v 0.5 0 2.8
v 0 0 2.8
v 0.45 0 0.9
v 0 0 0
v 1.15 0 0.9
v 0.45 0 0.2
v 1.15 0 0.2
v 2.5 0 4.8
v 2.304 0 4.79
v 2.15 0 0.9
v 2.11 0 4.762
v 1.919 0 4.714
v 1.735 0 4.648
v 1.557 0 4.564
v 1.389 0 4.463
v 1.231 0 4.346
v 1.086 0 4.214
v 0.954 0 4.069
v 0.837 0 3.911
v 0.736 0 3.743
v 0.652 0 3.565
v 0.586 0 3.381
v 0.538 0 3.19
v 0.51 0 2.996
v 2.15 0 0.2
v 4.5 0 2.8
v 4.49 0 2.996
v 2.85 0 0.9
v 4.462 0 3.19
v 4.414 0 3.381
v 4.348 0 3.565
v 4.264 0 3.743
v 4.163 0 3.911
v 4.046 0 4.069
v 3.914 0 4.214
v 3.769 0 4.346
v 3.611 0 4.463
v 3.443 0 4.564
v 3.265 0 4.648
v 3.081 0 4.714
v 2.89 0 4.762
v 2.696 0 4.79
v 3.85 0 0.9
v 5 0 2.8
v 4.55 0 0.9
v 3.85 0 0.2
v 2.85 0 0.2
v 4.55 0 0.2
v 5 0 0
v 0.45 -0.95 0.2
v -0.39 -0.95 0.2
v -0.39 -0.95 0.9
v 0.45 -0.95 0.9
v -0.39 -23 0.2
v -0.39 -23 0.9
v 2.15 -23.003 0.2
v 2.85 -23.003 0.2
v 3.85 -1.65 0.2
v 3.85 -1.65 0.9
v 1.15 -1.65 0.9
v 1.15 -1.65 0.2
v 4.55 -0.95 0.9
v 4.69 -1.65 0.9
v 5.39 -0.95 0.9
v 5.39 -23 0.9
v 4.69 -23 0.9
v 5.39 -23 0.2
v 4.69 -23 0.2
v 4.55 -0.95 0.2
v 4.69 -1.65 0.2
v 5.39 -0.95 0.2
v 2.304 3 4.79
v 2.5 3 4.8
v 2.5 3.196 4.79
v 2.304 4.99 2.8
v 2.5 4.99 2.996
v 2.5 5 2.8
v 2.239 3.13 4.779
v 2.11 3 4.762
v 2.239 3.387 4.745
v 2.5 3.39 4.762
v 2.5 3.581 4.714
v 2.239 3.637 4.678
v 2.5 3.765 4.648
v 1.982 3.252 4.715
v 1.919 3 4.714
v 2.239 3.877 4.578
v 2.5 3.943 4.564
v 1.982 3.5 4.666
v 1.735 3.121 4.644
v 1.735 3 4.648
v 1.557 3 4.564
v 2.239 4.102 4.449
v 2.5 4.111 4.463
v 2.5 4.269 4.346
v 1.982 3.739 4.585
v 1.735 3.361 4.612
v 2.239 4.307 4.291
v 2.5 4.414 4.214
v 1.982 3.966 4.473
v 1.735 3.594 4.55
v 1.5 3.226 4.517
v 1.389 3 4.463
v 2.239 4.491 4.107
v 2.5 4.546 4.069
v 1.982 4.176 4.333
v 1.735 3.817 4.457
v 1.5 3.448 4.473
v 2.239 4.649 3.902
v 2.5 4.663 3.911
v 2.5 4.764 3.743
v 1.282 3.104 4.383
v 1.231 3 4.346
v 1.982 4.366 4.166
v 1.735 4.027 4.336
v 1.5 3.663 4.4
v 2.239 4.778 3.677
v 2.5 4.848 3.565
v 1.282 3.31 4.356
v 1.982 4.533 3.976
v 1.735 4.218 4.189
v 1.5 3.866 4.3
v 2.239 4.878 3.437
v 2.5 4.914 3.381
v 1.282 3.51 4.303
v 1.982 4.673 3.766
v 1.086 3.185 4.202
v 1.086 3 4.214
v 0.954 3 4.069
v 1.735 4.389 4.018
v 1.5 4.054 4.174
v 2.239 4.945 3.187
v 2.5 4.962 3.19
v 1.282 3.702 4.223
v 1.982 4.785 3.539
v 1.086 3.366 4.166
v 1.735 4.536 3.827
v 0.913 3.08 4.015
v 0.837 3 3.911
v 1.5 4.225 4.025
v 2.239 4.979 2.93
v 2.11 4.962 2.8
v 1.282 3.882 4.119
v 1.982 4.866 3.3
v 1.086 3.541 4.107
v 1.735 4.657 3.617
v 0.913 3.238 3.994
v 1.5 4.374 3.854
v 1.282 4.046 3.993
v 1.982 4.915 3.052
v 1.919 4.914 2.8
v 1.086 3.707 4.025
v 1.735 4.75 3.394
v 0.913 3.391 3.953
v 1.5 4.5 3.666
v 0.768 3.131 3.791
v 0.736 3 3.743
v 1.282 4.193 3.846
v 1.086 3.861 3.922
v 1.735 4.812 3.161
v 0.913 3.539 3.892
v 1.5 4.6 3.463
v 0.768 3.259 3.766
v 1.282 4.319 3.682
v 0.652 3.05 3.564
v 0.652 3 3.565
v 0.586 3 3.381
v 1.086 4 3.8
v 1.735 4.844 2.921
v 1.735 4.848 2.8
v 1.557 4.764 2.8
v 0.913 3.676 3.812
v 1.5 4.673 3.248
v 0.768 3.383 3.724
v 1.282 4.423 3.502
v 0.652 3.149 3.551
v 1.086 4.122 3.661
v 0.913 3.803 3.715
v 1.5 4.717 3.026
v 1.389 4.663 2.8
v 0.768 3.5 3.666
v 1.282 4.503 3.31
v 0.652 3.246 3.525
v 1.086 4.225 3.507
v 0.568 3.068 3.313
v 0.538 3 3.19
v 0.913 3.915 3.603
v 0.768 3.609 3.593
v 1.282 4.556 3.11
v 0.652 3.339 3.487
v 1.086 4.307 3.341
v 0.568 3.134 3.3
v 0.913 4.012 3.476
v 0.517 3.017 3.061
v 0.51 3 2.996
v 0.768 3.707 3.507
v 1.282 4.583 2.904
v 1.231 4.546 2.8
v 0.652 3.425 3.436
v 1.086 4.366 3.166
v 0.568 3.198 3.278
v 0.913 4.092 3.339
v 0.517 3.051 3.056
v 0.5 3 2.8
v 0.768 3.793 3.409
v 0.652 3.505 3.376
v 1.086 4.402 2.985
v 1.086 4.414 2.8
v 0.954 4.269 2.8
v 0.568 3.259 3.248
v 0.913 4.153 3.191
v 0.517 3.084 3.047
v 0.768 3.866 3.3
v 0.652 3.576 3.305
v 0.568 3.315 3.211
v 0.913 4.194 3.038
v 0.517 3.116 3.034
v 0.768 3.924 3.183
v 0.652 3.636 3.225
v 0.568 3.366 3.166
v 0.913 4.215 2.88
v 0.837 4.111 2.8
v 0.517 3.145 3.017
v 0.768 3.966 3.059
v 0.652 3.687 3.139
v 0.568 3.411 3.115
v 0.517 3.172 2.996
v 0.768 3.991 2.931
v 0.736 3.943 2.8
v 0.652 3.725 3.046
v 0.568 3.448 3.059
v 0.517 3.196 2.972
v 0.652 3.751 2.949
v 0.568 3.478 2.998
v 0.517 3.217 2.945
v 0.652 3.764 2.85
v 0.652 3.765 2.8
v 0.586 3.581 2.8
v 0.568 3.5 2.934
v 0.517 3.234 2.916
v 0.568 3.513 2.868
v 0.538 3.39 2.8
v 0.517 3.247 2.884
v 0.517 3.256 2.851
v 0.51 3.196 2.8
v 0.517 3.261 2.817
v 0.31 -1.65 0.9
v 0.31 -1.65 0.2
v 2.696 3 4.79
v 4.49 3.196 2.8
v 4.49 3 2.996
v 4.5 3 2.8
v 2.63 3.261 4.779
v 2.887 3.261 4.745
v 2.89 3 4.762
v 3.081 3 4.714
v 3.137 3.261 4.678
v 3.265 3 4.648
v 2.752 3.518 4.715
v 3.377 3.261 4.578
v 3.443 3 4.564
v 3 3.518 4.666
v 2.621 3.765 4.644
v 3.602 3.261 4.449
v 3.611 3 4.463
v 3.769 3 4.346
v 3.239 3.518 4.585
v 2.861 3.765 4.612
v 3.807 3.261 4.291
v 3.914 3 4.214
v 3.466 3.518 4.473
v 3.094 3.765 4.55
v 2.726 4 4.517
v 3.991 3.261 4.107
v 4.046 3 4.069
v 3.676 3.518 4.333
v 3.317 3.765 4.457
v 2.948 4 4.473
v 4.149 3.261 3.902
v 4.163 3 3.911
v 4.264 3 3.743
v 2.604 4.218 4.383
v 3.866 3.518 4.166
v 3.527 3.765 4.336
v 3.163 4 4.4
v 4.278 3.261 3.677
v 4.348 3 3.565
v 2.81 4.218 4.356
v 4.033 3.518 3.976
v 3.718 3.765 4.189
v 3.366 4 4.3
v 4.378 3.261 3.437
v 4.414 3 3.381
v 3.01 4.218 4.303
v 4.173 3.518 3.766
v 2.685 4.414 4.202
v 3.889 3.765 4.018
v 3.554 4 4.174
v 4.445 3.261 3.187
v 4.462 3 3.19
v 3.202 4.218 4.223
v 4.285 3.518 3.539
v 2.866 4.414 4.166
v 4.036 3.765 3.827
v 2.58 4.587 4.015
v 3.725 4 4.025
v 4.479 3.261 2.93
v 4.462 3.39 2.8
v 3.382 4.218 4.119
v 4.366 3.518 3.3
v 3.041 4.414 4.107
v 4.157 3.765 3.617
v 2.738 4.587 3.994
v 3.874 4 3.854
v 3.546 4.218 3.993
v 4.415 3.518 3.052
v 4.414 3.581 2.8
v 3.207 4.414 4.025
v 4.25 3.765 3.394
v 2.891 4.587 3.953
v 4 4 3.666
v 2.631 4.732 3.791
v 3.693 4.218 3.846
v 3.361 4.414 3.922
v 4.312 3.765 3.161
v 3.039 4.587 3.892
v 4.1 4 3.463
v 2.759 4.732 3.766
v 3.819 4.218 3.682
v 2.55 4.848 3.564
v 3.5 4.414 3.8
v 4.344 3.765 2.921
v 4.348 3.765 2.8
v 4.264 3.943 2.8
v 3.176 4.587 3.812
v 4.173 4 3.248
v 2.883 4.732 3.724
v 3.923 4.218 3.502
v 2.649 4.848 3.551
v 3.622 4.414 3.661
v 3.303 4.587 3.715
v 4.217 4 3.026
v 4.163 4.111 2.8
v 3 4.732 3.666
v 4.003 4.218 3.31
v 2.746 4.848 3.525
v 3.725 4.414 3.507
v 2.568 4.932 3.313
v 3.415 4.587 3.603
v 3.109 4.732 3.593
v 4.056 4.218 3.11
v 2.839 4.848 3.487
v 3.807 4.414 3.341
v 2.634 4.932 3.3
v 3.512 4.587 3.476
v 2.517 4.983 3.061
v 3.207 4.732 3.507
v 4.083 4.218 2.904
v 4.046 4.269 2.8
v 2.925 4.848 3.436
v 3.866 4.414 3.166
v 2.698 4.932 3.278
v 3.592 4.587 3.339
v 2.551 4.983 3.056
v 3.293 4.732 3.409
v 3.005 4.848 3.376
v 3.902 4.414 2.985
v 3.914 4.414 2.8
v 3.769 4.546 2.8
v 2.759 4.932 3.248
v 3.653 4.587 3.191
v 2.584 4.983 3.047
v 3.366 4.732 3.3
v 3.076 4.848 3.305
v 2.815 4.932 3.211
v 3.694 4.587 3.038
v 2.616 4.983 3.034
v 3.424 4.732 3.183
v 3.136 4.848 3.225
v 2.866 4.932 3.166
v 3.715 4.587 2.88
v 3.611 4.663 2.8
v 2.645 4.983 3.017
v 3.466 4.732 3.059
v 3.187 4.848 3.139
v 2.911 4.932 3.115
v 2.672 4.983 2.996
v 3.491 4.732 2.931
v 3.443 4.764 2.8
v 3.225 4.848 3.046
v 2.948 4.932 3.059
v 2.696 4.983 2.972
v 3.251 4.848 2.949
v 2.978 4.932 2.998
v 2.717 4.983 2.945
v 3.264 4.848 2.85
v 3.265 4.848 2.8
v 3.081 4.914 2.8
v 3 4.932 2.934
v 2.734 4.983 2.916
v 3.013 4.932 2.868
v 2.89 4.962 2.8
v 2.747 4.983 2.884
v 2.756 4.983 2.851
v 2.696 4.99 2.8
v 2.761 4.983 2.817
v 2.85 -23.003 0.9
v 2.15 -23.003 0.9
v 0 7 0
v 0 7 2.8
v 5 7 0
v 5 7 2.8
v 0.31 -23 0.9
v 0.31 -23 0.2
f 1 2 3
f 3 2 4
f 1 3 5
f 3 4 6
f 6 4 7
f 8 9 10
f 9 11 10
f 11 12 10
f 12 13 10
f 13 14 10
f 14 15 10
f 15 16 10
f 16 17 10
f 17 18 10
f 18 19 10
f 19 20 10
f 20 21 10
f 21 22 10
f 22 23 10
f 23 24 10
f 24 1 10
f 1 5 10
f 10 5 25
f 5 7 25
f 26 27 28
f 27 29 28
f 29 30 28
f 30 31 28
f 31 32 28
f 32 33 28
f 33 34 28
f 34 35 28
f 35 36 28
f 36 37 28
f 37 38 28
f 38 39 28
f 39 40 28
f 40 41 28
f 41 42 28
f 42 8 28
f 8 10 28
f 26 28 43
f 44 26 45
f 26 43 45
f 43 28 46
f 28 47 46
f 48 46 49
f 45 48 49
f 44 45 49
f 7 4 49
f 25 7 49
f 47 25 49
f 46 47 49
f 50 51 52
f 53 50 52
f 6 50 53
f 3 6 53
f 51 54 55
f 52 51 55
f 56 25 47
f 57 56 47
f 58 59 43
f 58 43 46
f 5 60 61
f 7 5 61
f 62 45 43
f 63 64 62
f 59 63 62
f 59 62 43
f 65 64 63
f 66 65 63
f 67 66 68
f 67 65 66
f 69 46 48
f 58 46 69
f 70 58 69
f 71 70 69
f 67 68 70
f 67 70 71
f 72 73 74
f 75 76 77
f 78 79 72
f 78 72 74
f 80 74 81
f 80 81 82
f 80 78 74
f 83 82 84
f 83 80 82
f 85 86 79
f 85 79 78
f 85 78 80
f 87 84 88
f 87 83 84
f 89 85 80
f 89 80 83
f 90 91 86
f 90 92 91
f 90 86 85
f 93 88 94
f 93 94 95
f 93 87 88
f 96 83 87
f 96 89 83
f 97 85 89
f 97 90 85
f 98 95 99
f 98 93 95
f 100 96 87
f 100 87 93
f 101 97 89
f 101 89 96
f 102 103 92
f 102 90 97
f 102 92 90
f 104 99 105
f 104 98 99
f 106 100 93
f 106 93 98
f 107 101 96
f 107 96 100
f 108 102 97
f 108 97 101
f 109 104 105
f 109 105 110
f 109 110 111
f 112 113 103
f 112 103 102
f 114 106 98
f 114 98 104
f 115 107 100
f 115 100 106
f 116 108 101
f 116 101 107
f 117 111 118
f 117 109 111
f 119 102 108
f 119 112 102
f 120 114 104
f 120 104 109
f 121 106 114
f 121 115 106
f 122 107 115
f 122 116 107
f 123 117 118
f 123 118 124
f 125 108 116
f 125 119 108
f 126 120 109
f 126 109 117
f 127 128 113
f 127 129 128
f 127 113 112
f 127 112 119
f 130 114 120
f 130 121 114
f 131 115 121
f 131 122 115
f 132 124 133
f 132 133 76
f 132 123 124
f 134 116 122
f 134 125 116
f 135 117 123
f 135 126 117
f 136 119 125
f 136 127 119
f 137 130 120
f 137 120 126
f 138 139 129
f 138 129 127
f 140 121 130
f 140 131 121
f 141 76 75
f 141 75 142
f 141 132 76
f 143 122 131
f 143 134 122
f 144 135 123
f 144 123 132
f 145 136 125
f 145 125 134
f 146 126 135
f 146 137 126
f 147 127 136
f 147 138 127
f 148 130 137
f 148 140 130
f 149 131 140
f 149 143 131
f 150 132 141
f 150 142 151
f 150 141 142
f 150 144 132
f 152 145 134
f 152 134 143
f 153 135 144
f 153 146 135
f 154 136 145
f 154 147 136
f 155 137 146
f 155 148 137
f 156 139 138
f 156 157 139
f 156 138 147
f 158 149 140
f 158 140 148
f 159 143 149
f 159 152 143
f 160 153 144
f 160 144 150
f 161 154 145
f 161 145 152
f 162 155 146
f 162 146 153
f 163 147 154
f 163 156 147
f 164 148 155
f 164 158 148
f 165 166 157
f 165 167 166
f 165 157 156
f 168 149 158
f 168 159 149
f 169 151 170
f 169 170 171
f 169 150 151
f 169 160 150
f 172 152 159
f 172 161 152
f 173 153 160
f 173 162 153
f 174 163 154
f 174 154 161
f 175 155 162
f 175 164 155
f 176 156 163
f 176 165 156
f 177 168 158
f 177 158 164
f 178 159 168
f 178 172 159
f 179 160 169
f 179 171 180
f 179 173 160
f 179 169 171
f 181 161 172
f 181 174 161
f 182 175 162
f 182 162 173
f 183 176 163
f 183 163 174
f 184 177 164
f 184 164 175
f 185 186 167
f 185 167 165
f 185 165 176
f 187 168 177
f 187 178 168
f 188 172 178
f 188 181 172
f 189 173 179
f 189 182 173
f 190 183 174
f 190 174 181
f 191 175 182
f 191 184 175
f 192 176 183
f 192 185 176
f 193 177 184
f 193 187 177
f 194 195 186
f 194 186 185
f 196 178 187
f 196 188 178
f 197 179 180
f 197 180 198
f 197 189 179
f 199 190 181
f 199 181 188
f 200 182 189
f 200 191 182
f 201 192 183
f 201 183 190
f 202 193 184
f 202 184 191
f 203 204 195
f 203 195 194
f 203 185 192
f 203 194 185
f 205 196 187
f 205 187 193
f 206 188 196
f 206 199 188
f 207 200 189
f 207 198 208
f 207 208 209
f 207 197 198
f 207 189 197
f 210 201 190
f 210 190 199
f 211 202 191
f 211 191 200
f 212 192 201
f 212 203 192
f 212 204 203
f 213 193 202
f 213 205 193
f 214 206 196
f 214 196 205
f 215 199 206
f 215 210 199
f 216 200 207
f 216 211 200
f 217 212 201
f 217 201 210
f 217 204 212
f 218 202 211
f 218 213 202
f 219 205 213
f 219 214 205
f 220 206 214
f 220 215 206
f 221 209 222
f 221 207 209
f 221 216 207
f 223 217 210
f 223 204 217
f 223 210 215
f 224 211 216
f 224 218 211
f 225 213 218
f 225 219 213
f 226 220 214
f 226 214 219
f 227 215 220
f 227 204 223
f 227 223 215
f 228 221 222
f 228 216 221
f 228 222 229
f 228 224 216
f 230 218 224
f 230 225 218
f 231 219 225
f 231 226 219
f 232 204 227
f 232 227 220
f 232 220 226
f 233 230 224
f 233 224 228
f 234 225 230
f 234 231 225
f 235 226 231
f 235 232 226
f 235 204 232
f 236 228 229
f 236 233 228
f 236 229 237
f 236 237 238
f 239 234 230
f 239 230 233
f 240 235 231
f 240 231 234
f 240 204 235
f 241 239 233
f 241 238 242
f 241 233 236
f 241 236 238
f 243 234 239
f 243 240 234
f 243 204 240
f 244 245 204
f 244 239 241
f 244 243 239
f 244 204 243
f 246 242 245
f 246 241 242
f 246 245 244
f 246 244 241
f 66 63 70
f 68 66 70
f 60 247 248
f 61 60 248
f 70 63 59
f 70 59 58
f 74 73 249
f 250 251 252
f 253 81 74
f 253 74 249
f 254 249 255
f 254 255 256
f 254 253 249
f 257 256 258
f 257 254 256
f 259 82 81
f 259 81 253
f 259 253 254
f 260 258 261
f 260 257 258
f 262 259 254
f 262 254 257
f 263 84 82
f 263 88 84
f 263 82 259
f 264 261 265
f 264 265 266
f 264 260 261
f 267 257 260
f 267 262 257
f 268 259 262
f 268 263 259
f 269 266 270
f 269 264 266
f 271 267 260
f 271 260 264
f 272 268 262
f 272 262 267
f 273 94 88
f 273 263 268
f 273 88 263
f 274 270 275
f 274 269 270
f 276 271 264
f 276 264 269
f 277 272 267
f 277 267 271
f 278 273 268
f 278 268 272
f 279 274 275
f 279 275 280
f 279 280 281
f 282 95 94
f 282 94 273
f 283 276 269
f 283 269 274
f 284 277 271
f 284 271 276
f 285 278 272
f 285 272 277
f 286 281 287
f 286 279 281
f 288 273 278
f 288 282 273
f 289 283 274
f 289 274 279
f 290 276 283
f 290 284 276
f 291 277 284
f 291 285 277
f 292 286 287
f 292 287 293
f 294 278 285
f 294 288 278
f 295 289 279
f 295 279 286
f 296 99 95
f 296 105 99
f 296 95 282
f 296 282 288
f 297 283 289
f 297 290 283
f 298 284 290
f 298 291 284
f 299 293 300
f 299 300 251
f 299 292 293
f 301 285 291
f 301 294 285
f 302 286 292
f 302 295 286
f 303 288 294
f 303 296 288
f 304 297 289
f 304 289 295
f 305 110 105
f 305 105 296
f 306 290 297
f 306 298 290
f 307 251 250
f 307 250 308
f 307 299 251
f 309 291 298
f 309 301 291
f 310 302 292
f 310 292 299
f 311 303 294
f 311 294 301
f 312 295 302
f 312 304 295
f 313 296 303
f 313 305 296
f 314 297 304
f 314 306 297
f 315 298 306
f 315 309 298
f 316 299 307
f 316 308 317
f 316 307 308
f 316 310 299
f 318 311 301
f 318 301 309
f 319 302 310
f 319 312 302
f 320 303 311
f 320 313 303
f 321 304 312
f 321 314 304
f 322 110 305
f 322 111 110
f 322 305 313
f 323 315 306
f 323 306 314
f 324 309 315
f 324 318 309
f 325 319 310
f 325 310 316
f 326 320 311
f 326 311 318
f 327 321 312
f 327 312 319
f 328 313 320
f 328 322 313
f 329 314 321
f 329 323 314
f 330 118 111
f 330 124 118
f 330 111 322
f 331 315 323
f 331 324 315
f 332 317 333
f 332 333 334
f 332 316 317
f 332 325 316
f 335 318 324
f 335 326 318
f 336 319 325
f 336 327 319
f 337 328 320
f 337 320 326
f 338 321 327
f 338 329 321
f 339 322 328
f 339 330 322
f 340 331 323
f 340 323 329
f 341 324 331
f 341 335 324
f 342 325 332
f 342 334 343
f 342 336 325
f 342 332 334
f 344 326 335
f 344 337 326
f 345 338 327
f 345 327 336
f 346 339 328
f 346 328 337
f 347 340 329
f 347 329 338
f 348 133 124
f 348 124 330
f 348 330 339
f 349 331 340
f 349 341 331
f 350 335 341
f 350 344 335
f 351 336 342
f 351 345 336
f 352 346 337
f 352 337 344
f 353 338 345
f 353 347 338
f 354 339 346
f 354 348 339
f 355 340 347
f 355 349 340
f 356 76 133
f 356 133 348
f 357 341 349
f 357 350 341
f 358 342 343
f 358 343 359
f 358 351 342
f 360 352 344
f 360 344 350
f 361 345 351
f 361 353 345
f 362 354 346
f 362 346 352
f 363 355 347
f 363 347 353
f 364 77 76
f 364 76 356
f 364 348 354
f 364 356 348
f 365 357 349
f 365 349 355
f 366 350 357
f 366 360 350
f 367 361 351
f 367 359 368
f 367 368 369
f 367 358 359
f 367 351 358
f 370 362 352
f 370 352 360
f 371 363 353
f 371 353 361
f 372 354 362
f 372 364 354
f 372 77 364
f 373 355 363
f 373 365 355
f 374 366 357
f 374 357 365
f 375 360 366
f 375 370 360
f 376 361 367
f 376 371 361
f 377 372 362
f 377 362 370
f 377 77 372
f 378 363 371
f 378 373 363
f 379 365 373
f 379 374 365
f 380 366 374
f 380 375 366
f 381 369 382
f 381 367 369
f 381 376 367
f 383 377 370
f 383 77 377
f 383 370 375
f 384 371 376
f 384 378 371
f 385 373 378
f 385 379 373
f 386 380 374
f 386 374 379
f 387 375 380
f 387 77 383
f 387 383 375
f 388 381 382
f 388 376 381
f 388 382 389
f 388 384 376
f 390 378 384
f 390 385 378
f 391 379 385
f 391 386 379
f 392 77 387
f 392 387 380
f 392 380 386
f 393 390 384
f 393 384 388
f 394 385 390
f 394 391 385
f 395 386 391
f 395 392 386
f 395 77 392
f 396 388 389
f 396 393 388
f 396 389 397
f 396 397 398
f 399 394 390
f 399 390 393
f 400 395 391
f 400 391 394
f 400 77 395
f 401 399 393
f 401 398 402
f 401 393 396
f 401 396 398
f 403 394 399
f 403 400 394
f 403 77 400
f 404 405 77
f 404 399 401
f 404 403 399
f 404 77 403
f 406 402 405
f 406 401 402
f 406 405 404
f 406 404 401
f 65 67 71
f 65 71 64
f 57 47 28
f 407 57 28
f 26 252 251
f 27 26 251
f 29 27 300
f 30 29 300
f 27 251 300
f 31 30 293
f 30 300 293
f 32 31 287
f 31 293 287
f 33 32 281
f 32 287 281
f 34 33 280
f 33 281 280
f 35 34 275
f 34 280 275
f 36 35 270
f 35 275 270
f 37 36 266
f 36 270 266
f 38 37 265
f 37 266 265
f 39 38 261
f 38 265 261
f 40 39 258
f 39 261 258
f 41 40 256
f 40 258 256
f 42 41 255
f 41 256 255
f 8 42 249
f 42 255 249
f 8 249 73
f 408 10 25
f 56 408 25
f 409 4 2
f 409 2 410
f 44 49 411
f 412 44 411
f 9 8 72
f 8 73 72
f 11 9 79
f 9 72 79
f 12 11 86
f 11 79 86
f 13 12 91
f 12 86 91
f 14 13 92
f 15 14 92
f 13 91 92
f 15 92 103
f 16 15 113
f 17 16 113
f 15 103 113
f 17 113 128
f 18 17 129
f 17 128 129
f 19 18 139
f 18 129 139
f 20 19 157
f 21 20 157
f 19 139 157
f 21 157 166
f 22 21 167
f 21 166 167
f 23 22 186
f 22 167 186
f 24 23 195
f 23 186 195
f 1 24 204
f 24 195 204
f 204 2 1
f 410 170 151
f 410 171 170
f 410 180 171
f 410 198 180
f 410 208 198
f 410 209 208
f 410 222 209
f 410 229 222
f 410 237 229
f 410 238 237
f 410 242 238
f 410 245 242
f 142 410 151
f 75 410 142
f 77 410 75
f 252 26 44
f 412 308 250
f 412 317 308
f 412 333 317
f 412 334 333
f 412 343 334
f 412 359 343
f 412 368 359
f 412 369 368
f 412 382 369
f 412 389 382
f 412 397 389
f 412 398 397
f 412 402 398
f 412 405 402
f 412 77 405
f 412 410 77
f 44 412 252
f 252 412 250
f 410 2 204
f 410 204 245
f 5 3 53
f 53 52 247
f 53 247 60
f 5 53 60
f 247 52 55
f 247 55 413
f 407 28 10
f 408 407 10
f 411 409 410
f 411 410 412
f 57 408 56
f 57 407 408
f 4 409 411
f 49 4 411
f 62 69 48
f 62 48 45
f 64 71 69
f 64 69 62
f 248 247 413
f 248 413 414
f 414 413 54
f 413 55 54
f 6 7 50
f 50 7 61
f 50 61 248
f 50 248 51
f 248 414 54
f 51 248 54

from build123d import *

# Parameters (mm, degrees)
IZIM1_W                     = 5
IZIM1_H                     = 7
Y_KSEKLIK_EKSTR_ZYON1_DEPTH = 2.8
IZIM2_W                     = 4
IZIM2_H                     = 5
Y_KSEKLIK_EKSTR_ZYON2_DEPTH = 2
RADYUS2_R                   = 2
IZIM3_W                     = 0.7
IZIM3_H                     = 0.7
IZIM5_W                     = 0.7
IZIM5_H                     = 0.7


with BuildPart() as part:
    # Çizim1 → Yükseklik-Ekstrüzyon1 (new body)
    with BuildSketch(Plane.XY):
        with Locations((2.5, 3.5)):
            Rectangle(IZIM1_W, IZIM1_H)
    extrude(amount=Y_KSEKLIK_EKSTR_ZYON1_DEPTH)

    # Çizim2 → Yükseklik-Ekstrüzyon2 (add)
    with BuildSketch(Plane.XY.offset(2.8)):
        with Locations((2.5, 2.5)):
            Rectangle(IZIM2_W, IZIM2_H)
    extrude(amount=Y_KSEKLIK_EKSTR_ZYON2_DEPTH)

    # Radyus2
    radyus2_edges = [part.edges().sort_by_distance(p)[0] for p in [
        (4.5, 2.5, 4.8),
    ]]
    fillet(radyus2_edges, radius=RADYUS2_R - 0.0001)  # a hair under: the kernel refuses the full size
    radyus2_2_edges = [part.edges().sort_by_distance(p)[0] for p in [
        (1.50005, 5, 4.8),
    ]]
    fillet(radyus2_2_edges, radius=RADYUS2_R - 0.0001)  # a hair under: the kernel refuses the full size
    radyus2_3_edges = [part.edges().sort_by_distance(p)[0] for p in [
        (0.5, 1.50005, 4.8),
    ]]
    fillet(radyus2_3_edges, radius=RADYUS2_R - 0.0001)  # a hair under: the kernel refuses the full size

    # Süpür1: sweep along a path in Çizim4
    with BuildLine(Plane(origin=(0, 0, 0.55), x_dir=(-1, 0, 0), z_dir=(0, 0, -1))) as s_p_r1_path:
        Line((-4.2, 0), (-4.2, -1.3))
        Line((-4.2, -1.3), (-5.04, -1.3))
        Line((-5.04, -1.3), (-5.04, -23))
    # Çizim3 → Süpür1 (sweep)
    with BuildSketch(Plane.XZ):
        with Locations((4.2, 0.55)):
            Rectangle(IZIM3_W, IZIM3_H)
    s_p_r1 = sweep(path=s_p_r1_path.line, transition=Transition.RIGHT)

    # Aynalama1: Süpür1 across plane
    add(s_p_r1.mirror(Plane(origin=(2.5, 0, 0), x_dir=(0, 0, 1), z_dir=(1, 0, 0))))

    # Süpür2: sweep along a path in Çizim6
    with BuildLine(Plane(origin=(0, 0, 0.55), x_dir=(-1, 0, 0), z_dir=(0, 0, -1))) as s_p_r2_path:
        Line((-2.5, 0), (-2.5, -23.002662889))
    # Çizim5 → Süpür2 (sweep)
    with BuildSketch(Plane.XZ):
        with Locations((2.5, 0.55)):
            Rectangle(IZIM5_W, IZIM5_H)
    sweep(path=s_p_r2_path.line)


solid = part.part
